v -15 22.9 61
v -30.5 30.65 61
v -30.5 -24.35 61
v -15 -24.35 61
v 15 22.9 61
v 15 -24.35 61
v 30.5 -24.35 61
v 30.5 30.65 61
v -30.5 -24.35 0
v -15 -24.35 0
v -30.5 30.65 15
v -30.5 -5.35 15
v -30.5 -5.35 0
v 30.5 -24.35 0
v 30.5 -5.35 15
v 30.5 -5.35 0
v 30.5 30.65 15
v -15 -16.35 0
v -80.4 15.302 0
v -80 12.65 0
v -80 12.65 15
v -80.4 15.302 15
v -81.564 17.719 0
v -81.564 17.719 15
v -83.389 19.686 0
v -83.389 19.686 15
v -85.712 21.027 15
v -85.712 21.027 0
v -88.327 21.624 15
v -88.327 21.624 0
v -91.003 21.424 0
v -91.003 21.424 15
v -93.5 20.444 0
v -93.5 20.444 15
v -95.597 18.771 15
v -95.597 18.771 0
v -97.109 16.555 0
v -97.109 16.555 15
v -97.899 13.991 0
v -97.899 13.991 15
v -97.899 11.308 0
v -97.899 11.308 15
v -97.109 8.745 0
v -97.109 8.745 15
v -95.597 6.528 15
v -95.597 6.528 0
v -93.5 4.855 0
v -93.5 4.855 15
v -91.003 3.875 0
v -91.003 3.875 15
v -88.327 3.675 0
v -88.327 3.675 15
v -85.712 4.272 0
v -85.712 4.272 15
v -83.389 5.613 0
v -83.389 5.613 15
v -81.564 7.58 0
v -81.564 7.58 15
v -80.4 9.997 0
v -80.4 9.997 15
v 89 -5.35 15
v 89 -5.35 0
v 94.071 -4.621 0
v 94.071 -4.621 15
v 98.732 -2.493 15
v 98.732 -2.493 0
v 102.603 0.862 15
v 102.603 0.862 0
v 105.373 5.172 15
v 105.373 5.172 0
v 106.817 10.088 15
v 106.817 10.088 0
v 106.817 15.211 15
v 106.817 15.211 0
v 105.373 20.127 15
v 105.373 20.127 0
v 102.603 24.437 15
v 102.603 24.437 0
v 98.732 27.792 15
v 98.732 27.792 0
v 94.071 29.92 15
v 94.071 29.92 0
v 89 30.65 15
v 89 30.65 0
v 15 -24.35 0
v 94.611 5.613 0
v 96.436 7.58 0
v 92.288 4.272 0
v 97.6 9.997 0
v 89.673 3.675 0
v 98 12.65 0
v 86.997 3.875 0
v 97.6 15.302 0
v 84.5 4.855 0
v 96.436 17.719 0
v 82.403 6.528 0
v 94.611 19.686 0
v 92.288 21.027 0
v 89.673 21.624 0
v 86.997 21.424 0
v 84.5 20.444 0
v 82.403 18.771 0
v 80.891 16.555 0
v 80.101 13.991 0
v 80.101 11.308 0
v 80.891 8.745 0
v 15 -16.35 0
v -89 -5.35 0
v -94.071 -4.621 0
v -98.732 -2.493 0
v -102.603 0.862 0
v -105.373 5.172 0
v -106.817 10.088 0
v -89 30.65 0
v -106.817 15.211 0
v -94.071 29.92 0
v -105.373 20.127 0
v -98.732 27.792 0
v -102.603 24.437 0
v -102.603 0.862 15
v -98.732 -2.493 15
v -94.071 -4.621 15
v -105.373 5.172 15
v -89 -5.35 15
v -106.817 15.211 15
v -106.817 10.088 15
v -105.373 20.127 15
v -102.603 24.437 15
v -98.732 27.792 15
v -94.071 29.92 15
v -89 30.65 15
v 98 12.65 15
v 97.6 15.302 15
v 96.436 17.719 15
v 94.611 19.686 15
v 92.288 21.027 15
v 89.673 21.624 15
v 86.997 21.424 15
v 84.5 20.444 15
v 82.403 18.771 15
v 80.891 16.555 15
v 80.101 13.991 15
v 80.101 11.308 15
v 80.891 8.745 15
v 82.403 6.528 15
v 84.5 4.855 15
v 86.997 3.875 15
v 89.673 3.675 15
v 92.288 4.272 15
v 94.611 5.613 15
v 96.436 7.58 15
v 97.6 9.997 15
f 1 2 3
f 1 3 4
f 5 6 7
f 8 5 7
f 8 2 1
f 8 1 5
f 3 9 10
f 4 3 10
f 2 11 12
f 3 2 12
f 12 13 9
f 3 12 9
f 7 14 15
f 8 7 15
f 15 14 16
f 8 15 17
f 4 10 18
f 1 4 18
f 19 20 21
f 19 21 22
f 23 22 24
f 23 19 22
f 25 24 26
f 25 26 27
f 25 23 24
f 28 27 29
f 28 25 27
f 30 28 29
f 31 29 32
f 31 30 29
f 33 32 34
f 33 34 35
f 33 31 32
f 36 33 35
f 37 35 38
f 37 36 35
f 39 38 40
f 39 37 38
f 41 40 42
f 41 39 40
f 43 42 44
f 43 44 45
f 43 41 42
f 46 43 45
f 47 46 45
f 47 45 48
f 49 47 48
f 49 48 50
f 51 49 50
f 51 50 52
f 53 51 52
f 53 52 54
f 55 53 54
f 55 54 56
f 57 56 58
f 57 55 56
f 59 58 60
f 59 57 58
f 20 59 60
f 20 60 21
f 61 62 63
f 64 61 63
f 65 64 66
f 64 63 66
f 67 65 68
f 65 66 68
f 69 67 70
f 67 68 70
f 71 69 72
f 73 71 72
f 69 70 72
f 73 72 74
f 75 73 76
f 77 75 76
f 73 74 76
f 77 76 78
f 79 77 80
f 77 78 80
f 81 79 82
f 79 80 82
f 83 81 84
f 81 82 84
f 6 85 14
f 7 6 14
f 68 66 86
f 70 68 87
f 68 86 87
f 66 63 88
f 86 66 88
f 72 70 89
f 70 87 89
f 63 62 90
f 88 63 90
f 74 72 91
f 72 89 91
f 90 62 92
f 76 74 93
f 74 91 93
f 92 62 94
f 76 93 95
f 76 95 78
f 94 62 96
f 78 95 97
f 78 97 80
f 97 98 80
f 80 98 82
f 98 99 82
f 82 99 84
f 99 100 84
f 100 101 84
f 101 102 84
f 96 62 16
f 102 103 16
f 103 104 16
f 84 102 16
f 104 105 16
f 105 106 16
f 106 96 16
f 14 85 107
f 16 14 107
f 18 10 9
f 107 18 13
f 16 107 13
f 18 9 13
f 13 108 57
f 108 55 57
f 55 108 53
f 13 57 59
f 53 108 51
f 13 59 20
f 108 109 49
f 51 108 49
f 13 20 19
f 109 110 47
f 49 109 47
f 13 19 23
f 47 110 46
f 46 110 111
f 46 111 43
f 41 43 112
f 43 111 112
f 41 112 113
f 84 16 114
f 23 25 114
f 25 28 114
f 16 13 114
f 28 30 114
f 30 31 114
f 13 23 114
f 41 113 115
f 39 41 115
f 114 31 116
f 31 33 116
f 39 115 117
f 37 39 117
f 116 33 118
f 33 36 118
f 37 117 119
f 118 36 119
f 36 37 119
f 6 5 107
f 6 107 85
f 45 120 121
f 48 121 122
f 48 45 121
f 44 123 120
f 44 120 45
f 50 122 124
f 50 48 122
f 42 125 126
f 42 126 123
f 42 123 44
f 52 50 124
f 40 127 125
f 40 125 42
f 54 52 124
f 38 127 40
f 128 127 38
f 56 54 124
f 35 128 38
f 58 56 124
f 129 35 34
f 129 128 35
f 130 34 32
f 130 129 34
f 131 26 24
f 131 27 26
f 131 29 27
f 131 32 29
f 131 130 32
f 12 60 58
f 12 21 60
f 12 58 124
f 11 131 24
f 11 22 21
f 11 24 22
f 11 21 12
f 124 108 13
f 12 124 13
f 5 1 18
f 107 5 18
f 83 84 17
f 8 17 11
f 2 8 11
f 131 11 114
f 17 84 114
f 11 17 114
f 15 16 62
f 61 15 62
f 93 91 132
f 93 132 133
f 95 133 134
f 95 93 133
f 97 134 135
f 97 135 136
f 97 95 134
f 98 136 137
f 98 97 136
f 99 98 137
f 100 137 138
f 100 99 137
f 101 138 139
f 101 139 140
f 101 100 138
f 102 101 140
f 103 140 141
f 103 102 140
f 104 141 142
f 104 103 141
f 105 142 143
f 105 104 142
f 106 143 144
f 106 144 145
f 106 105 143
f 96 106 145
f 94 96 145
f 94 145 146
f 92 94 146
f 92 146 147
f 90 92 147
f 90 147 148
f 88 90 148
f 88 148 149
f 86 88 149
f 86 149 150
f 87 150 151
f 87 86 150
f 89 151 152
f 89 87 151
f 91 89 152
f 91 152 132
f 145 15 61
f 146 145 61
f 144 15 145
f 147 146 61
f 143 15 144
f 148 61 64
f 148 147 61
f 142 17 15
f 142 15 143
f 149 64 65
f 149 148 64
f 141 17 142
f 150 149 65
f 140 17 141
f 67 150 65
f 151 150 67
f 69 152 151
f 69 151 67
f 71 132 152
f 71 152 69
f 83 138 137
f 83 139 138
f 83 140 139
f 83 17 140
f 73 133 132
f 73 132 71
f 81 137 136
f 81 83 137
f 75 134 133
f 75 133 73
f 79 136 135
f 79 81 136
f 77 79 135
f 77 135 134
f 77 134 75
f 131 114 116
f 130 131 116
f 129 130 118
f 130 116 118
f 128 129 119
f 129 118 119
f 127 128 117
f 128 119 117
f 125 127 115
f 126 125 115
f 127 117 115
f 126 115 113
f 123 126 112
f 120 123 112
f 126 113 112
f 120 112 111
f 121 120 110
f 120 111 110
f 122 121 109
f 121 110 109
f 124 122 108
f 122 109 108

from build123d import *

# Parameters (mm, degrees)
F1_DEPTH = 61
F0_R     = 9
F2_DEPTH = 15
F4_DEPTH = 30


with BuildPart() as f1:
    # F0 (on Top) → F1 (new body)
    with BuildSketch(Plane.XY):
        Polygon((30.5, 30.649616), (-30.5, 30.649616), (-30.5, -5.350384), (-30.5, -24.350384), (-15, -24.350384), (-15, -16.350384), (-15, 22.899616), (0, 22.899616), (15, 22.899616), (15, -16.350384), (15, -24.350384), (30.5, -24.350384), (30.5, -5.350384), align=None)
    extrude(amount=F1_DEPTH)

    # F0 (on Top) → F2 (join)
    with BuildSketch(Plane.XY):
        with BuildLine():
            Line((89, 30.649616), (30.5, 30.649616))
            Line((30.5, 30.649616), (30.5, -5.350384))
            Line((30.5, -5.350384), (89, -5.350384))
            ThreePointArc((89, -5.350384), (107, 12.649616), (89, 30.649616))
        make_face()
        with Locations((89, 12.649616)):
            Circle(F0_R, mode=Mode.SUBTRACT)
        with BuildLine():
            Line((-30.5, -5.350384), (-30.5, 30.649616))
            Line((-30.5, 30.649616), (-89, 30.649616))
            ThreePointArc((-89, 30.649616), (-107, 12.649616), (-89, -5.350384))
            Line((-89, -5.350384), (-30.5, -5.350384))
        make_face()
        with Locations((-89, 12.649616)):
            Circle(F0_R, mode=Mode.SUBTRACT)
    extrude(amount=F2_DEPTH)

    # F3 (on face) → F4 (join)
    with BuildSketch(Plane.YZ.offset(-15)):
        Polygon((22.899616, 0), (22.899616, 61), (-16.350384, 0), align=None)
    extrude(amount=F4_DEPTH)


solid = f1.part
